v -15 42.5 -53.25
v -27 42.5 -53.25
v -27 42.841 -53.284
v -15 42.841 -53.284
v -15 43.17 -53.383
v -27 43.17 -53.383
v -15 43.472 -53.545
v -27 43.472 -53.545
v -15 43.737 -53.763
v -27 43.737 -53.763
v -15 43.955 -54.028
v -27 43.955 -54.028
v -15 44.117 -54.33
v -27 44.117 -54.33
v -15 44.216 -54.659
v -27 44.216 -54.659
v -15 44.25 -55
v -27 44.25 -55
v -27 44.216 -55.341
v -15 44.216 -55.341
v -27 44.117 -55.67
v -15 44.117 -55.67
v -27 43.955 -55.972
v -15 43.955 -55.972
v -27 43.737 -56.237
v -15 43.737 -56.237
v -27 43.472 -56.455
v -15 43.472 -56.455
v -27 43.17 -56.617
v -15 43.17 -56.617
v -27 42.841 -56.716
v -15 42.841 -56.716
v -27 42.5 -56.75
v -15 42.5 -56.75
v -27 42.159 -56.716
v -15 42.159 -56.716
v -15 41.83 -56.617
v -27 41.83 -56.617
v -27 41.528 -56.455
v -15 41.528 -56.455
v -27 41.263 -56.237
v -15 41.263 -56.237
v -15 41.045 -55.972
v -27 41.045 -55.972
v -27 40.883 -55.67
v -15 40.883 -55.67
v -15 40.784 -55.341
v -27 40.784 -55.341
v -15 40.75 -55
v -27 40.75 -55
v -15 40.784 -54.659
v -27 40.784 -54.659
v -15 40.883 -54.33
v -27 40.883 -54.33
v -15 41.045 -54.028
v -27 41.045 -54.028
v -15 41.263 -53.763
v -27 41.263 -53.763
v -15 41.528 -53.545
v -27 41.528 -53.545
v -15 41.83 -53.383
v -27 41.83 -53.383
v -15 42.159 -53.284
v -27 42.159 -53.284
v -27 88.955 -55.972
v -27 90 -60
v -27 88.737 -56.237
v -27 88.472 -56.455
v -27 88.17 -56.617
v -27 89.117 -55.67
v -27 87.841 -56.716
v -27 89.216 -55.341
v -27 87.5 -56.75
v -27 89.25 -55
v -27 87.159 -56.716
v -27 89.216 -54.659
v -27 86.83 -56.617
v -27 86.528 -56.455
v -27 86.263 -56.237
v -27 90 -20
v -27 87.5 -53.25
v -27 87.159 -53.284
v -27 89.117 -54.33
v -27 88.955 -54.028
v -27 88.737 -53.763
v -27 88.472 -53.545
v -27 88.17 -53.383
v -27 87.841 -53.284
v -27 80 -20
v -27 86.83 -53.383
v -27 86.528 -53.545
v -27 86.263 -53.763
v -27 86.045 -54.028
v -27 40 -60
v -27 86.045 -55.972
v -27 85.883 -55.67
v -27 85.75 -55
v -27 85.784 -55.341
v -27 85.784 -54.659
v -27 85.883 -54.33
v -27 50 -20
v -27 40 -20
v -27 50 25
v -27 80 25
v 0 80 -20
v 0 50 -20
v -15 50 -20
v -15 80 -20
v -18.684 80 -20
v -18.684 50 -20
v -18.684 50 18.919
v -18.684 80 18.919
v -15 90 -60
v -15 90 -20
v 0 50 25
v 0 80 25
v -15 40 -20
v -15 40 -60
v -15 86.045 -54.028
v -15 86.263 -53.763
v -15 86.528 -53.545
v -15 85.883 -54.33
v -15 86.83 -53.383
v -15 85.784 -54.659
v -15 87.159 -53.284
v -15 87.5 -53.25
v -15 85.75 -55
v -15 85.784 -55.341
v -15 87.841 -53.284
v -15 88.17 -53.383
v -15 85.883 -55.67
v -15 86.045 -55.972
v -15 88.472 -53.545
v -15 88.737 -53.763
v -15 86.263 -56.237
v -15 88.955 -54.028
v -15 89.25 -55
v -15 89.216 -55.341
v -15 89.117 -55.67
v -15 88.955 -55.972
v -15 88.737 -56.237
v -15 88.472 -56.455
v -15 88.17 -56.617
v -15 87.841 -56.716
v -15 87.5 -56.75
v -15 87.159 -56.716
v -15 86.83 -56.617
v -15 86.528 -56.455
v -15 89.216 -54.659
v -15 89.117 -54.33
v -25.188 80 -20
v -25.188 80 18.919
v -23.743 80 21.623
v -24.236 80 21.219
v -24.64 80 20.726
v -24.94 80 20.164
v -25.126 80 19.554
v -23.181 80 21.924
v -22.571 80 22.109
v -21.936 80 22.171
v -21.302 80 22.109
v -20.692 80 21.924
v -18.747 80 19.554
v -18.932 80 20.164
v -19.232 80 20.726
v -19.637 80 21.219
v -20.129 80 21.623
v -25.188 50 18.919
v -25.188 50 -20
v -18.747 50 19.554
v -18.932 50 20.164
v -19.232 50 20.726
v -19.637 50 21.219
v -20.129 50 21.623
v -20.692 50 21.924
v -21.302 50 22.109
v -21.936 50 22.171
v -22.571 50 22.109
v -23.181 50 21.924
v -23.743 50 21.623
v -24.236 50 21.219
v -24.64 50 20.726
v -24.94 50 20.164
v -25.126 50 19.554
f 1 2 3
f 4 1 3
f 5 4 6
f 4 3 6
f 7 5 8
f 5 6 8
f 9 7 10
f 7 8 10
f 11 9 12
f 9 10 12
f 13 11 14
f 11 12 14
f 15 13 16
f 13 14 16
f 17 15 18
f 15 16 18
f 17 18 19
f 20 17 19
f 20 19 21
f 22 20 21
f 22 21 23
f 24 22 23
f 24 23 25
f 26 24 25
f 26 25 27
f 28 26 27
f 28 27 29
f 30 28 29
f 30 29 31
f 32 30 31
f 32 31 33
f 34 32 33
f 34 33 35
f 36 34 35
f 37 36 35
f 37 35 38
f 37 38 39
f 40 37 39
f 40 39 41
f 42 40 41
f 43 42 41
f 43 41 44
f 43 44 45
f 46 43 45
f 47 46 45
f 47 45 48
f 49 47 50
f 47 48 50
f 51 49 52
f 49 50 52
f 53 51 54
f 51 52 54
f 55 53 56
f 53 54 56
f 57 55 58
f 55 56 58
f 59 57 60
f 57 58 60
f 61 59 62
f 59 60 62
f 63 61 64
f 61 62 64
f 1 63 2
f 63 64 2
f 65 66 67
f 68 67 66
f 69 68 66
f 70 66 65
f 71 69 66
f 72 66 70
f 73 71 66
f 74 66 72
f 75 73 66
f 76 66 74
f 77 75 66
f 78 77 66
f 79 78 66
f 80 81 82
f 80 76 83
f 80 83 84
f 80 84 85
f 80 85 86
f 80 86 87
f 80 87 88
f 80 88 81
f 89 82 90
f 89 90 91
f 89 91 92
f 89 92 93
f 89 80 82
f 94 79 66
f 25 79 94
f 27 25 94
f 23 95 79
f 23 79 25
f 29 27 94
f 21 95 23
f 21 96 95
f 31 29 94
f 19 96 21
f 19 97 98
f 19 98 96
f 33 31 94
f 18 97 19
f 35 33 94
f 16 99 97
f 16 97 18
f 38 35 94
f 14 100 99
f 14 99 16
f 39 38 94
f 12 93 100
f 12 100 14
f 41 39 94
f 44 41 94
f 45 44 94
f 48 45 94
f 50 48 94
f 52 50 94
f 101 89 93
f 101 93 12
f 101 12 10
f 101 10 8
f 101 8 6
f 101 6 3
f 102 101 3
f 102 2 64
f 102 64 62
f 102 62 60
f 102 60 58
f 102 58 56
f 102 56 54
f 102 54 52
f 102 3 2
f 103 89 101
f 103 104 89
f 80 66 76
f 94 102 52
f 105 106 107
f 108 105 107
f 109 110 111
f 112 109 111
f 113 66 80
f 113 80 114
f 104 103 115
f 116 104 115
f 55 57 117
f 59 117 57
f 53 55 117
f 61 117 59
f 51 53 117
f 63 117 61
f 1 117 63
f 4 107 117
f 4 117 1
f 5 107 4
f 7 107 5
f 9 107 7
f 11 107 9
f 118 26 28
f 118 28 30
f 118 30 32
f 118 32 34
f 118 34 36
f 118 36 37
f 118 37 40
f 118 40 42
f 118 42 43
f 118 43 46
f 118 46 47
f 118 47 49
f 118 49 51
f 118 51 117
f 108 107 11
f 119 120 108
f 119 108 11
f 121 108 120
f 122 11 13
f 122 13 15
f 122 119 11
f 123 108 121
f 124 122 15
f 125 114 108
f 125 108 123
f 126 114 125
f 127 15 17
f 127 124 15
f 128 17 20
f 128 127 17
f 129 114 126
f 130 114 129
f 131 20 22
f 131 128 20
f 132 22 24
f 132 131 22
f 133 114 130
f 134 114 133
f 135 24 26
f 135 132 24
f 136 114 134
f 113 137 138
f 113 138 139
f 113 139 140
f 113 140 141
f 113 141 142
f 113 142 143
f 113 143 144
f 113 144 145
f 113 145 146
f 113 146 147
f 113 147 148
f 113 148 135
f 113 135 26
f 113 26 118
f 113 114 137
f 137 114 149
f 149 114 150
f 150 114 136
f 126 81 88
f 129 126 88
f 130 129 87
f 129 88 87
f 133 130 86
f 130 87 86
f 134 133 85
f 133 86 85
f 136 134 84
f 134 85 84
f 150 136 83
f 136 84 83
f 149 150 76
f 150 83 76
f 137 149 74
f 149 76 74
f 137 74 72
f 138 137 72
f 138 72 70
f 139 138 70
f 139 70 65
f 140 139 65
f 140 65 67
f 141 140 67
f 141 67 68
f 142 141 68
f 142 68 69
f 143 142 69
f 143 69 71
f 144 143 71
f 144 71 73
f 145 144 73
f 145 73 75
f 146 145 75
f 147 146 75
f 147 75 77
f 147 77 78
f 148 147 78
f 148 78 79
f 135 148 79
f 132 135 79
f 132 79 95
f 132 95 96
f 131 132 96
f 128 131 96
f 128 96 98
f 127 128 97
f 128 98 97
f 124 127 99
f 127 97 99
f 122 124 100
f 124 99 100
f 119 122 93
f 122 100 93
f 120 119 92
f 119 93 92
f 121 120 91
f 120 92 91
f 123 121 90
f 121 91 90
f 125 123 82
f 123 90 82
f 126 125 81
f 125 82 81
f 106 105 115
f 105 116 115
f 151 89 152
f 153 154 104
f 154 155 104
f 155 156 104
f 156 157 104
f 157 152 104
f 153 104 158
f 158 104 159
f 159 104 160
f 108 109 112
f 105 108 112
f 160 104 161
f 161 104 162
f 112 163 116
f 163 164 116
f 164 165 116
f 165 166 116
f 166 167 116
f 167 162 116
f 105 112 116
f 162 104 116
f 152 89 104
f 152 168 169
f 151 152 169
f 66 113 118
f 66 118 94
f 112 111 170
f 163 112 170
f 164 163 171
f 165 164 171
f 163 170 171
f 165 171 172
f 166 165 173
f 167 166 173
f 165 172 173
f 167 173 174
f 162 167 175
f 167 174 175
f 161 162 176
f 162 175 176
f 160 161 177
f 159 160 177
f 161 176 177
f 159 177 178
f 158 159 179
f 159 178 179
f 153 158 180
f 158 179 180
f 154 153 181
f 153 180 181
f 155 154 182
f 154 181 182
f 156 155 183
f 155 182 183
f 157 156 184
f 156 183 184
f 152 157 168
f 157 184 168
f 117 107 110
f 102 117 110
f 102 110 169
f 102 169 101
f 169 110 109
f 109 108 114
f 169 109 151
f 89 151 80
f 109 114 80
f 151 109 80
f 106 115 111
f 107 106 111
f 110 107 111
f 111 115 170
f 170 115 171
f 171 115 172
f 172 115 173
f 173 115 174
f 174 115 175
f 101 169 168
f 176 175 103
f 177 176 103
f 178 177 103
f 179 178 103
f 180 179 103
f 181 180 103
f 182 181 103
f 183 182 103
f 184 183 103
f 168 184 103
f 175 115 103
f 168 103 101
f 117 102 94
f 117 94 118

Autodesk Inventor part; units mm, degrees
ref_plane "YZ Plane" through (0, 0, 0) normal (1, 0, 0) x (0, 1, 0)
ref_plane "XZ Plane" through (0, 0, 0) normal (0, 1, 0) x (-1, 0, 0)
ref_plane "XY Plane" through (0, 0, 0) normal (0, 0, 1) x (1, 0, 0)
ref_plane "Arbeitsebene1" through (0, 0, 0) normal (0, 0, 1) x (1, 0, 0)
sketch "Skizze1" plane through (0, 0, 0) normal (0, 0, 1) x (1, 0, 0)
  circle A0 centre (-13.5, 65) radius 3 construction
  circle A1 centre (-13.5, 65) radius 3 construction
  line L0 (0, 130) -> (0, 0) construction
  line L1 (0, 130) -> (-27, 130) construction
  line L2 (-27, 0) -> (-27, 130) construction
  line L3 (0, 0) -> (-27, 0) construction
  line L4 (-27, 80) -> (0, 80)
  line L5 (0, 80) -> (0, 50)
  line L6 (0, 50) -> (-27, 50)
  line L7 (-27, 50) -> (-27, 80)
  line L8 (-27, 80) -> (0, 50) construction
  line L9 (0, 80) -> (-27, 50) construction
  dimension "d0" = 30
extrude "Extrusion1" add sketch "Skizze1" along normal blind 25
sketch "Skizze3" plane through (-27, 80, 0) normal (0, 1, 0) x (1, 0, 0)
  line L0 (0, 0) -> (0, -25) projected
  line L1 (0, 0) -> (5.0639, 0)
  line L2 (5.0639, 0) -> (5.0639, -24.302)
  line L3 (5.0639, -24.302) -> (0, -24.302)
  line L4 (0, -24.302) -> (0, 0)
  circle A0 centre (5.0639, -18.8642) radius 3.15
  circle A1 centre (5.0639, -8.0952) radius 3.15
  circle A2 centre (5.0639, -12.5) radius 3.25
  point P0 (27, 0)
  dimension "d6" = 6.3
  dimension "d7" = 6.3
  dimension "d10" = 6.5
extrude "Extrusion4" cut sketch "Skizze3" against normal through all contours A2 A1 L2 | L2 A1 A2 | A1 L2 A0 A2 | A2 A0 L2 | L2 A0 A2 | A1 A2 A0 L2 picked at (5.2798, -10.5577) picked at (4.848, -10.5577) picked at (5.0263, -15.7268) picked at (5.1015, -15.7268)
sketch "Skizze5" plane through (-27, 50, 0) normal (0, -1, 0) x (1, 0, 0)
  circle A0 centre (5.0639, 12.5) radius 3.25 construction
  line L0 (5.0639, 18.9193) -> (5.0639, 6.0807) construction
  line L1 (1.812, 18.9193) -> (1.812, 6.0807)
  line L2 (8.3158, 6.0807) -> (8.3158, 18.9193)
  arc A1 (8.3158, 18.9193) -> (1.812, 18.9193) centre (5.0639, 18.9193) ccw
  arc A2 (1.812, 6.0807) -> (8.3158, 6.0807) centre (5.0639, 6.0807) ccw
  point P0 (27, 0)
extrude "Extrusion6" cut sketch "Skizze5" against normal through all
sketch "Skizze6" plane through (0, 0, 0) normal (0, 0, -1) x (-1, 0, 0)
  line L0 (27, 50) -> (0, 50) projected
  line L1 (27, 80) -> (0, 80) projected
  line L2 (27, 50) -> (15, 50)
  line L3 (15, 50) -> (15, 80)
  line L4 (15, 80) -> (27, 80)
  line L5 (27, 80) -> (27, 50)
  point P0 (0, 0)
  dimension "d20" = 12
extrude "Extrusion7" add sketch "Skizze6" along normal blind 60
sketch "Skizze7" plane through (-27, 80, 25) normal (0, 1, 0) x (1, 0, 0)
  line L0 (12, 25) -> (27, 25) construction
  line L1 (12, 25) -> (12, 85) construction
  line L2 (0, 85) -> (12, 85) construction
  line L3 (0, 85) -> (0, 0) construction
  line L4 (27, 0) -> (0, 0) construction
  line L5 (27, 25) -> (27, 0) construction
  arc A0 (8.3158, 18.9193) -> (1.812, 18.9193) centre (5.0639, 18.9193) ccw construction
  line L6 (8.3158, 18.9193) -> (8.3158, 6.0807) construction
  arc A1 (1.812, 6.0807) -> (8.3158, 6.0807) centre (5.0639, 6.0807) ccw construction
  line L7 (1.812, 6.0807) -> (1.812, 18.9193) construction
  line L8 (5.0639, 18.9193) -> (5.0639, 77.8219) construction
  line L9 (8.3158, 18.9193) -> (8.3158, 77.8219)
  line L10 (1.812, 77.8219) -> (1.812, 18.9193)
  arc A2 (1.812, 18.9193) -> (8.3158, 18.9193) centre (5.0639, 18.9193) ccw
  arc A3 (8.3158, 77.8219) -> (1.812, 77.8219) centre (5.0639, 77.8219) ccw
  point P0 (27, 25)
  point P1 (5.0639, 48.3706)
extrude "Extrusion8" cut sketch "Skizze7" against normal through all
sketch "Skizze8" plane through (0, 0, 0) normal (0, 0, -1) x (-1, 0, 0)
  line L0 (15, 50) -> (15, 80) projected
  line L1 (15, 80) -> (0, 80) projected
  line L2 (0, 80) -> (0, 50) projected
  line L3 (0, 50) -> (15, 50) projected
  point P0 (0, 0)
extrude "Extrusion9" add sketch "Skizze8" along normal blind 20
sketch "Skizze10" plane through (-27, 50, 25) normal (0, -1, 0) x (1, 0, 0)
  line L0 (1.812, -77.8219) -> (1.812, -6.0807) projected
  arc A0 (8.3158, -6.0807) -> (1.812, -6.0807) centre (5.0639, -6.0807) ccw projected
  line L1 (8.3158, -6.0807) -> (8.3158, -77.8219) projected
  arc A1 (1.812, -77.8219) -> (8.3158, -77.8219) centre (5.0639, -77.8219) ccw projected
  line L2 (27, 0) -> (27, -45) projected
  line L3 (0, 0) -> (27, 0) projected
  line L4 (0, 0) -> (0, -85) projected
  line L5 (12, -85) -> (0, -85) projected
  line L6 (12, -45) -> (12, -85) projected
  line L7 (27, -45) -> (12, -45) projected
  line L8 (12, -45) -> (12, -85) projected
  line L9 (12, -45) -> (0, -45)
  point P0 (27, -25)
extrude "Extrusion10" add sketch "Skizze10" along normal blind 10 contours A1 L1 L9 L6 L5 L4 L0 | L0 L9 L1 A1
sketch "Skizze11" plane through (-27, 80, 25) normal (0, 1, 0) x (1, 0, 0)
  line L0 (0, 85) -> (0, 0) projected
  line L1 (27, 0) -> (0, 0) projected
  line L2 (27, 0) -> (27, 45) projected
  line L3 (12, 45) -> (27, 45) projected
  line L4 (12, 45) -> (12, 85) projected
  line L5 (0, 85) -> (12, 85) projected
  line L6 (1.812, 6.0807) -> (1.812, 77.8219) projected
  arc A0 (8.3158, 77.8219) -> (1.812, 77.8219) centre (5.0639, 77.8219) ccw projected
  line L7 (8.3158, 77.8219) -> (8.3158, 6.0807) projected
  arc A1 (1.812, 6.0807) -> (8.3158, 6.0807) centre (5.0639, 6.0807) ccw projected
  line L8 (12, 45) -> (0, 45) projected
  line L9 (12, 45) -> (0, 45)
  point P0 (27, 25)
extrude "Extrusion11" add sketch "Skizze11" along normal blind 10 contours L5 L4 L8 L7 A0 L6 L0 | L6 A0 L7 L8
sketch "Skizze13" plane through (-27, 40, 25) normal (0, -1, 0) x (1, 0, 0)
  line L0 (0, -85) -> (12, -85) projected
  line L1 (12, -85) -> (12, -45) projected
  line L2 (12, -45) -> (0, -45) projected
  line L3 (0, -45) -> (0, -85) projected
  point P0 (27, -25)
extrude "Extrusion12" add sketch "Skizze13" against normal up to surface (50 mm away)
sketch "Skizze14" plane through (-27, 50, 25) normal (-1, 0, 0) x (0, 0, 1)
  line L0 (-85, 40) -> (-85, -10) projected
  line L1 (-85, 15) -> (-0.0726, 15)
  line L2 (-85, 21.5305) -> (-80, 21.5305)
  line L3 (-80, 15) -> (-80, 37.5)
  line L4 (-80, 37.5) -> (-80, -7.5)
  circle A0 centre (-80, -7.5) radius 1.75
  circle A1 centre (-80, 37.5) radius 1.75
  point P0 (-25, -50)
  dimension "d38" = 5
  dimension "d39" = 22.5
  dimension "d40" = 45
  dimension "d41" = 3.5
  dimension "d42" = 3.5
extrude "Extrusion13" cut sketch "Skizze14" against normal through all contours A1 | A0
properties part number "kinect_fixt"
